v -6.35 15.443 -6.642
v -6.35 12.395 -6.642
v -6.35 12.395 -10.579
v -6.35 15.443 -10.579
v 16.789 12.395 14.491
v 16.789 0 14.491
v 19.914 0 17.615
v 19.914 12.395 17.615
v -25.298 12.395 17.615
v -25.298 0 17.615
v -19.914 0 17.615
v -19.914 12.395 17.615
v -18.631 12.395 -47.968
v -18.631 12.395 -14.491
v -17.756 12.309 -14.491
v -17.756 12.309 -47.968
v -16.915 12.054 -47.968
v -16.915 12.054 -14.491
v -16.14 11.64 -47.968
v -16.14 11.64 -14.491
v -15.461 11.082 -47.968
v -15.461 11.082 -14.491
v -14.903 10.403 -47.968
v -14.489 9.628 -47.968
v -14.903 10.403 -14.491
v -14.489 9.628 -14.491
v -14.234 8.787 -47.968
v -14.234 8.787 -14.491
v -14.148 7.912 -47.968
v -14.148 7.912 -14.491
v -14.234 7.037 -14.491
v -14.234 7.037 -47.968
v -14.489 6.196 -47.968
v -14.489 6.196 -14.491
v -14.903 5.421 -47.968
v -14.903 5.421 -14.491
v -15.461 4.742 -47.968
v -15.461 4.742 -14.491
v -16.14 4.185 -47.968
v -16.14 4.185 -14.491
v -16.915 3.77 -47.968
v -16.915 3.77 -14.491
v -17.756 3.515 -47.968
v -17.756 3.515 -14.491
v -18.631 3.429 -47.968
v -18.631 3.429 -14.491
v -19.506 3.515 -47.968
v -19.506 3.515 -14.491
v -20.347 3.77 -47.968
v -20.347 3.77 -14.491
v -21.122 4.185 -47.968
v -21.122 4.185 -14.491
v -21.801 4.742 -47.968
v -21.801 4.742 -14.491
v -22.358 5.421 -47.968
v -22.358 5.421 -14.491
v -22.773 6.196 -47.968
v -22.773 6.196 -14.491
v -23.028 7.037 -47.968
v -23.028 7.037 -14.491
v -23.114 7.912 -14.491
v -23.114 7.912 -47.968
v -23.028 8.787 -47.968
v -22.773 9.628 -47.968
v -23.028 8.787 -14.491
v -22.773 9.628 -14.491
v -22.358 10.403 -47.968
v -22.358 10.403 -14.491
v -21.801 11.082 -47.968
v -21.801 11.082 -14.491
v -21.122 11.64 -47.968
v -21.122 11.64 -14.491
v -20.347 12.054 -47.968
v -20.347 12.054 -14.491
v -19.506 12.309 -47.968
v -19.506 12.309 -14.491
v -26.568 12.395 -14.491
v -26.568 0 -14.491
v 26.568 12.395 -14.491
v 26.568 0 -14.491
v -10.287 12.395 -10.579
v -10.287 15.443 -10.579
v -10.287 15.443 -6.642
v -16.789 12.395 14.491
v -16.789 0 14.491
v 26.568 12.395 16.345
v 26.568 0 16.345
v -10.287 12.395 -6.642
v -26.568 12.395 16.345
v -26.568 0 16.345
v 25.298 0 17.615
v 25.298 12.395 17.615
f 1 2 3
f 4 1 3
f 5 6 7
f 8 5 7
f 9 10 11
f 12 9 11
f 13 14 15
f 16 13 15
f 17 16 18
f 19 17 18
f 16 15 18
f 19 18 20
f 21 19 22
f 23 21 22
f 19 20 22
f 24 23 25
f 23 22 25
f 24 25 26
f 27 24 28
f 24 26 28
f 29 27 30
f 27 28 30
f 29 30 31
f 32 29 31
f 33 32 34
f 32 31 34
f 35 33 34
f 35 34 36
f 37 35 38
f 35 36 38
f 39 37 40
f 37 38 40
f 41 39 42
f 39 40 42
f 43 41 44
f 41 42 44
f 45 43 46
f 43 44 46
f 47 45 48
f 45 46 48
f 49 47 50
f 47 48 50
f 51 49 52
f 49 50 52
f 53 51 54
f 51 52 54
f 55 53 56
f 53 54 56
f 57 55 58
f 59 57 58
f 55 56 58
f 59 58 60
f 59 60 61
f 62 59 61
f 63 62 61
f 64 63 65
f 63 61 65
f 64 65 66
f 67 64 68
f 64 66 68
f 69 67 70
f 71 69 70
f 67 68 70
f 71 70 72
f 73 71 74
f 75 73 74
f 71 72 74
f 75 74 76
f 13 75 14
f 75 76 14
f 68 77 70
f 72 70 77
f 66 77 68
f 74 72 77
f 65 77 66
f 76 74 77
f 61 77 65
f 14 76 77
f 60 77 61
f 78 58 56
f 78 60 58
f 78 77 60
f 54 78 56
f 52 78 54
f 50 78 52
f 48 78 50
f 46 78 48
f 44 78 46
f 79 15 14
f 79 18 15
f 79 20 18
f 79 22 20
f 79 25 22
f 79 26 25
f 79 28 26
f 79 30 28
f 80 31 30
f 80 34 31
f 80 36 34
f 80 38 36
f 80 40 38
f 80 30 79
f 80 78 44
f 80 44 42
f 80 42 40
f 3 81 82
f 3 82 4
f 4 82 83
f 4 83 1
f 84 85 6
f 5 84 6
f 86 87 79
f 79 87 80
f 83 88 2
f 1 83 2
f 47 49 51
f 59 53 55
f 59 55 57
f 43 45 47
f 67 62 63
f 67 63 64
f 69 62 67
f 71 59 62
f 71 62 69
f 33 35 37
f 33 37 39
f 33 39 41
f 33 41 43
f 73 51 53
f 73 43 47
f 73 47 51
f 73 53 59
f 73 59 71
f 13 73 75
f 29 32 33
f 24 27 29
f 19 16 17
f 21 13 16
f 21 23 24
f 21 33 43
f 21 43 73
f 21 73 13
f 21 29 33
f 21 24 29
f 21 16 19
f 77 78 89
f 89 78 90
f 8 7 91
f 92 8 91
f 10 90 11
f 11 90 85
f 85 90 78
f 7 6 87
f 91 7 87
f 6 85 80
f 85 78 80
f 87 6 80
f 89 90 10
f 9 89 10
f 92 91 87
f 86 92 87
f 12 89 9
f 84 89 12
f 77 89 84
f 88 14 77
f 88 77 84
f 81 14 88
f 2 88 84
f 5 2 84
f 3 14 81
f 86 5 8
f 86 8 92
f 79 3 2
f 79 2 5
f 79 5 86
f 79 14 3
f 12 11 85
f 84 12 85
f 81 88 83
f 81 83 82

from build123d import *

# Parameters (mm, degrees)
SKETCH2_W           = 53.1368
SKETCH2_H           = 28.9814
SKETCH2_W_2         = 5.3848
SKETCH2_H_2         = 3.1242
BOSS_EXTRUDE1_DEPTH = 12.3952
SKETCH3_R           = 4.4831
BOSS_EXTRUDE2_DEPTH = 33.4772
SKETCH5_W           = 3.937
SKETCH5_H           = 3.937
BOSS_EXTRUDE3_DEPTH = 3.048


with BuildPart() as part:
    # Sketch2 → Boss-Extrude1 (new body)
    with BuildSketch(Plane(origin=(0, 0, 0), x_dir=(1, 0, 0), z_dir=(0, 1, 0))):
        Rectangle(SKETCH2_W, SKETCH2_H)
        Polygon((26.5684, -14.4907), (25.2984, -14.4907), (25.2984, -17.6149), (26.5684, -16.3449), align=None)
        with Locations((22.606, -16.0528)):
            Rectangle(SKETCH2_W_2, SKETCH2_H_2)
        Polygon((19.9136, -14.4907), (16.7894, -14.4907), (19.9136, -17.6149), align=None)
        Polygon((-26.5684, -16.3449), (-25.2984, -17.6149), (-25.2984, -14.4907), (-26.5684, -14.4907), align=None)
        with Locations((-22.606, -16.0528)):
            Rectangle(SKETCH2_W_2, SKETCH2_H_2)
        Polygon((-19.9136, -14.4907), (-19.9136, -17.6149), (-16.7894, -14.4907), align=None)
    extrude(amount=BOSS_EXTRUDE1_DEPTH)

    # Sketch3 → Boss-Extrude2 (add)
    with BuildSketch(Plane(origin=(0, 0, -14.4907), x_dir=(-1, 0, 0), z_dir=(0, 0, -1))):
        with Locations(Location((18.6309, 7.9121, 0), (0, 0, 90))):
            Circle(SKETCH3_R)
    extrude(amount=BOSS_EXTRUDE2_DEPTH)

    # Sketch5 → Boss-Extrude3 (add)
    with BuildSketch(Plane(origin=(0, 12.3952, 0), x_dir=(1, 0, 0), z_dir=(0, 1, 0))):
        with Locations((-8.3185, 8.6106)):
            Rectangle(SKETCH5_W, SKETCH5_H)
    extrude(amount=BOSS_EXTRUDE3_DEPTH)


solid = part.part
